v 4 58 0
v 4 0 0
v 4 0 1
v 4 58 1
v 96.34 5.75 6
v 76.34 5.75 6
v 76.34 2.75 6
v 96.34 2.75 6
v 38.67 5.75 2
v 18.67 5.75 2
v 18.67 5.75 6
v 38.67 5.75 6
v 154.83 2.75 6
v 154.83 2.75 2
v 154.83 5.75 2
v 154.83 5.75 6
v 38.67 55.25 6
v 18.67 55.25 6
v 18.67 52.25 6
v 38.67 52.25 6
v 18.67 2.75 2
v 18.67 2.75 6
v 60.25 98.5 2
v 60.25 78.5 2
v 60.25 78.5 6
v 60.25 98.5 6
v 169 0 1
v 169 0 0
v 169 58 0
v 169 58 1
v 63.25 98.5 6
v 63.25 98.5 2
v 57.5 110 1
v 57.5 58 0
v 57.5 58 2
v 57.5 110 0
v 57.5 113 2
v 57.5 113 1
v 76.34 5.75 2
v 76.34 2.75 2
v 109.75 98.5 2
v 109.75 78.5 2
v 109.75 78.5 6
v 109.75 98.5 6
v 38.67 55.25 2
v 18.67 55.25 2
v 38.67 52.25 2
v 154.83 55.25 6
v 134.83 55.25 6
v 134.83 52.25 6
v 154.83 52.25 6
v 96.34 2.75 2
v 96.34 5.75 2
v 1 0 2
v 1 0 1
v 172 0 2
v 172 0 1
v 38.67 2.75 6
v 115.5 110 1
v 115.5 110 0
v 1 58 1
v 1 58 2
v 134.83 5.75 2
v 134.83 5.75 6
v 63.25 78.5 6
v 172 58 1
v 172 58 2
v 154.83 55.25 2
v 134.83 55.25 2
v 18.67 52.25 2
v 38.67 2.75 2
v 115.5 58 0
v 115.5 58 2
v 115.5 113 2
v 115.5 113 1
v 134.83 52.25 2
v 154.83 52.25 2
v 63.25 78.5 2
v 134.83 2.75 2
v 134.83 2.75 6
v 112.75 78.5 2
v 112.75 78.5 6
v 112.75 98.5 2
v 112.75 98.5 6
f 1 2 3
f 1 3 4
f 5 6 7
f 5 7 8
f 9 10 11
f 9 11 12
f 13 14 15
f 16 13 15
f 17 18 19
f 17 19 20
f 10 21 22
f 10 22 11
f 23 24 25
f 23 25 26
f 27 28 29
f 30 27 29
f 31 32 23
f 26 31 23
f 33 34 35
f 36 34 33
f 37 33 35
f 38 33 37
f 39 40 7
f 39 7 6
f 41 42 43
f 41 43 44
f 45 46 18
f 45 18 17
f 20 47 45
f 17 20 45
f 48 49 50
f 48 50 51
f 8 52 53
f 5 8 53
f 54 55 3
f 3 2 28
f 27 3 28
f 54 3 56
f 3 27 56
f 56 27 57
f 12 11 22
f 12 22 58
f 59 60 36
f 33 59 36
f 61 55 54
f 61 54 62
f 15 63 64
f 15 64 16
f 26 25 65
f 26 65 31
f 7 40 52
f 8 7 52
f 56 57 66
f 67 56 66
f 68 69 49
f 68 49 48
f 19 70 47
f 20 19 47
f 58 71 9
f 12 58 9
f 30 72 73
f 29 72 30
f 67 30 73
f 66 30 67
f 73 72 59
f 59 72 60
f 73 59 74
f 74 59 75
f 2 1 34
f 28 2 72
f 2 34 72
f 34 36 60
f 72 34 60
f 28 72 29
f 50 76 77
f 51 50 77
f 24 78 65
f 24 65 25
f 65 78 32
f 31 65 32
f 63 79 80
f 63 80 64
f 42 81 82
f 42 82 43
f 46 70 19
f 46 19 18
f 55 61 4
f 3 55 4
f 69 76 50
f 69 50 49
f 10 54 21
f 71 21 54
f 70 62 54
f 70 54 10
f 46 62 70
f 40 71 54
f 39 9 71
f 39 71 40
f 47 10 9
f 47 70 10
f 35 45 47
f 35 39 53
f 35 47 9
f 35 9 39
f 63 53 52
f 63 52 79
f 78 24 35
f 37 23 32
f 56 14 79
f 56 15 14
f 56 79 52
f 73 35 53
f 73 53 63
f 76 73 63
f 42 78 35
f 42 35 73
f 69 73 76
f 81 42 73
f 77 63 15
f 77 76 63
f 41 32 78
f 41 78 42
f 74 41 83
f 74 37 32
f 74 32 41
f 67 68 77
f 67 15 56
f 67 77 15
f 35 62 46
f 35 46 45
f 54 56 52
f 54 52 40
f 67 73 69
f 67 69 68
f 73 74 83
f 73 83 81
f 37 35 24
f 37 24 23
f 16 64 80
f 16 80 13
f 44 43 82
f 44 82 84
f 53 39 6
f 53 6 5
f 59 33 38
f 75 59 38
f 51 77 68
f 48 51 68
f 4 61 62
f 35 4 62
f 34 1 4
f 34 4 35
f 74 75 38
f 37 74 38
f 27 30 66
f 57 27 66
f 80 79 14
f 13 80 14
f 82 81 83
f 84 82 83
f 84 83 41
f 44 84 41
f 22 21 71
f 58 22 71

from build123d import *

# Parameters (mm, degrees)
BOX010_W     = 3
BOX010_H     = 58
BOX010_DEPTH = 1
BOX009_W     = 3
BOX009_H     = 58
BOX009_DEPTH = 1
BOX008_W     = 20
BOX008_H     = 3
BOX008_DEPTH = 6
BOX007_W     = 20
BOX007_H     = 3
BOX007_DEPTH = 6
BOX006_W     = 20
BOX006_H     = 3
BOX006_DEPTH = 6
BOX005_W     = 20
BOX005_H     = 3
BOX005_DEPTH = 6
BOX004_W     = 20
BOX004_H     = 3
BOX004_DEPTH = 6
BOX003_W     = 20
BOX003_H     = 3
BOX003_DEPTH = 6
BOX002_W     = 20
BOX002_H     = 3
BOX002_DEPTH = 6
BOX001_W     = 110
BOX001_H     = 58
BOX001_DEPTH = 2
BOX_W        = 165
BOX_H        = 58
BOX_DEPTH    = 2
BOX011_W     = 3
BOX011_H     = 58
BOX011_DEPTH = 1


with BuildPart() as cube010:
    # Box010 → Box010 (new body)
    with BuildSketch(Plane(origin=(169, 0, 1), x_dir=(1, 0, 0), z_dir=(0, 0, 1))):
        with Locations((1.5, 29)):
            Rectangle(BOX010_W, BOX010_H)
    extrude(amount=BOX010_DEPTH)


with BuildPart() as cube009:
    # Box009 → Box009 (new body)
    with BuildSketch(Plane(origin=(1, 0, 1), x_dir=(1, 0, 0), z_dir=(0, 0, 1))):
        with Locations((1.5, 29)):
            Rectangle(BOX009_W, BOX009_H)
    extrude(amount=BOX009_DEPTH)


with BuildPart() as cube008:
    # Box008 → Box008 (new body)
    with BuildSketch(Plane(origin=(112.75, 78.5, 0), x_dir=(0, 1, 0), z_dir=(0, 0, 1))):
        with Locations((10, 1.5)):
            Rectangle(BOX008_W, BOX008_H)
    extrude(amount=BOX008_DEPTH)


with BuildPart() as cube007:
    # Box007 → Box007 (new body)
    with BuildSketch(Plane(origin=(63.25, 78.5, 0), x_dir=(0, 1, 0), z_dir=(0, 0, 1))):
        with Locations((10, 1.5)):
            Rectangle(BOX007_W, BOX007_H)
    extrude(amount=BOX007_DEPTH)


with BuildPart() as cube006:
    # Box006 → Box006 (new body)
    with BuildSketch(Plane(origin=(134.83, 52.25, 0), x_dir=(1, 0, 0), z_dir=(0, 0, 1))):
        with Locations((10, 1.5)):
            Rectangle(BOX006_W, BOX006_H)
    extrude(amount=BOX006_DEPTH)


with BuildPart() as cube005:
    # Box005 → Box005 (new body)
    with BuildSketch(Plane(origin=(18.67, 52.25, 0), x_dir=(1, 0, 0), z_dir=(0, 0, 1))):
        with Locations((10, 1.5)):
            Rectangle(BOX005_W, BOX005_H)
    extrude(amount=BOX005_DEPTH)


with BuildPart() as cube004:
    # Box004 → Box004 (new body)
    with BuildSketch(Plane(origin=(134.83, 2.75, 0), x_dir=(1, 0, 0), z_dir=(0, 0, 1))):
        with Locations((10, 1.5)):
            Rectangle(BOX004_W, BOX004_H)
    extrude(amount=BOX004_DEPTH)


with BuildPart() as cube003:
    # Box003 → Box003 (new body)
    with BuildSketch(Plane(origin=(76.34, 2.75, 0), x_dir=(1, 0, 0), z_dir=(0, 0, 1))):
        with Locations((10, 1.5)):
            Rectangle(BOX003_W, BOX003_H)
    extrude(amount=BOX003_DEPTH)


with BuildPart() as cube002:
    # Box002 → Box002 (new body)
    with BuildSketch(Plane(origin=(18.67, 2.75, 0), x_dir=(1, 0, 0), z_dir=(0, 0, 1))):
        with Locations((10, 1.5)):
            Rectangle(BOX002_W, BOX002_H)
    extrude(amount=BOX002_DEPTH)


with BuildPart() as cube001:
    # Box001 → Box001 (new body)
    with BuildSketch(Plane(origin=(115.5, 0, 0), x_dir=(0, 1, 0), z_dir=(0, 0, 1))):
        with Locations((55, 29)):
            Rectangle(BOX001_W, BOX001_H)
    extrude(amount=BOX001_DEPTH)


with BuildPart() as cube:
    # Box → Box (new body)
    with BuildSketch(Plane(origin=(4, 0, 0), x_dir=(1, 0, 0), z_dir=(0, 0, 1))):
        with Locations((82.5, 29)):
            Rectangle(BOX_W, BOX_H)
    extrude(amount=BOX_DEPTH)


with BuildPart() as fusion:
    # Box011 → Box011 (new body)
    with BuildSketch(Plane(origin=(115.5, 110, 1), x_dir=(0, 1, 0), z_dir=(0, 0, 1))):
        with Locations((1.5, 29)):
            Rectangle(BOX011_W, BOX011_H)
    extrude(amount=BOX011_DEPTH)

    # Fusion: union Cube010, Cube009, Cube008, Cube007, Cube006, Cube005, Cube004, Cube003, Cube002, Cube001, Cube
    add(cube010.part)
    add(cube009.part)
    add(cube008.part)
    add(cube007.part)
    add(cube006.part)
    add(cube005.part)
    add(cube004.part)
    add(cube003.part)
    add(cube002.part)
    add(cube001.part)
    add(cube.part)


solid = fusion.part
